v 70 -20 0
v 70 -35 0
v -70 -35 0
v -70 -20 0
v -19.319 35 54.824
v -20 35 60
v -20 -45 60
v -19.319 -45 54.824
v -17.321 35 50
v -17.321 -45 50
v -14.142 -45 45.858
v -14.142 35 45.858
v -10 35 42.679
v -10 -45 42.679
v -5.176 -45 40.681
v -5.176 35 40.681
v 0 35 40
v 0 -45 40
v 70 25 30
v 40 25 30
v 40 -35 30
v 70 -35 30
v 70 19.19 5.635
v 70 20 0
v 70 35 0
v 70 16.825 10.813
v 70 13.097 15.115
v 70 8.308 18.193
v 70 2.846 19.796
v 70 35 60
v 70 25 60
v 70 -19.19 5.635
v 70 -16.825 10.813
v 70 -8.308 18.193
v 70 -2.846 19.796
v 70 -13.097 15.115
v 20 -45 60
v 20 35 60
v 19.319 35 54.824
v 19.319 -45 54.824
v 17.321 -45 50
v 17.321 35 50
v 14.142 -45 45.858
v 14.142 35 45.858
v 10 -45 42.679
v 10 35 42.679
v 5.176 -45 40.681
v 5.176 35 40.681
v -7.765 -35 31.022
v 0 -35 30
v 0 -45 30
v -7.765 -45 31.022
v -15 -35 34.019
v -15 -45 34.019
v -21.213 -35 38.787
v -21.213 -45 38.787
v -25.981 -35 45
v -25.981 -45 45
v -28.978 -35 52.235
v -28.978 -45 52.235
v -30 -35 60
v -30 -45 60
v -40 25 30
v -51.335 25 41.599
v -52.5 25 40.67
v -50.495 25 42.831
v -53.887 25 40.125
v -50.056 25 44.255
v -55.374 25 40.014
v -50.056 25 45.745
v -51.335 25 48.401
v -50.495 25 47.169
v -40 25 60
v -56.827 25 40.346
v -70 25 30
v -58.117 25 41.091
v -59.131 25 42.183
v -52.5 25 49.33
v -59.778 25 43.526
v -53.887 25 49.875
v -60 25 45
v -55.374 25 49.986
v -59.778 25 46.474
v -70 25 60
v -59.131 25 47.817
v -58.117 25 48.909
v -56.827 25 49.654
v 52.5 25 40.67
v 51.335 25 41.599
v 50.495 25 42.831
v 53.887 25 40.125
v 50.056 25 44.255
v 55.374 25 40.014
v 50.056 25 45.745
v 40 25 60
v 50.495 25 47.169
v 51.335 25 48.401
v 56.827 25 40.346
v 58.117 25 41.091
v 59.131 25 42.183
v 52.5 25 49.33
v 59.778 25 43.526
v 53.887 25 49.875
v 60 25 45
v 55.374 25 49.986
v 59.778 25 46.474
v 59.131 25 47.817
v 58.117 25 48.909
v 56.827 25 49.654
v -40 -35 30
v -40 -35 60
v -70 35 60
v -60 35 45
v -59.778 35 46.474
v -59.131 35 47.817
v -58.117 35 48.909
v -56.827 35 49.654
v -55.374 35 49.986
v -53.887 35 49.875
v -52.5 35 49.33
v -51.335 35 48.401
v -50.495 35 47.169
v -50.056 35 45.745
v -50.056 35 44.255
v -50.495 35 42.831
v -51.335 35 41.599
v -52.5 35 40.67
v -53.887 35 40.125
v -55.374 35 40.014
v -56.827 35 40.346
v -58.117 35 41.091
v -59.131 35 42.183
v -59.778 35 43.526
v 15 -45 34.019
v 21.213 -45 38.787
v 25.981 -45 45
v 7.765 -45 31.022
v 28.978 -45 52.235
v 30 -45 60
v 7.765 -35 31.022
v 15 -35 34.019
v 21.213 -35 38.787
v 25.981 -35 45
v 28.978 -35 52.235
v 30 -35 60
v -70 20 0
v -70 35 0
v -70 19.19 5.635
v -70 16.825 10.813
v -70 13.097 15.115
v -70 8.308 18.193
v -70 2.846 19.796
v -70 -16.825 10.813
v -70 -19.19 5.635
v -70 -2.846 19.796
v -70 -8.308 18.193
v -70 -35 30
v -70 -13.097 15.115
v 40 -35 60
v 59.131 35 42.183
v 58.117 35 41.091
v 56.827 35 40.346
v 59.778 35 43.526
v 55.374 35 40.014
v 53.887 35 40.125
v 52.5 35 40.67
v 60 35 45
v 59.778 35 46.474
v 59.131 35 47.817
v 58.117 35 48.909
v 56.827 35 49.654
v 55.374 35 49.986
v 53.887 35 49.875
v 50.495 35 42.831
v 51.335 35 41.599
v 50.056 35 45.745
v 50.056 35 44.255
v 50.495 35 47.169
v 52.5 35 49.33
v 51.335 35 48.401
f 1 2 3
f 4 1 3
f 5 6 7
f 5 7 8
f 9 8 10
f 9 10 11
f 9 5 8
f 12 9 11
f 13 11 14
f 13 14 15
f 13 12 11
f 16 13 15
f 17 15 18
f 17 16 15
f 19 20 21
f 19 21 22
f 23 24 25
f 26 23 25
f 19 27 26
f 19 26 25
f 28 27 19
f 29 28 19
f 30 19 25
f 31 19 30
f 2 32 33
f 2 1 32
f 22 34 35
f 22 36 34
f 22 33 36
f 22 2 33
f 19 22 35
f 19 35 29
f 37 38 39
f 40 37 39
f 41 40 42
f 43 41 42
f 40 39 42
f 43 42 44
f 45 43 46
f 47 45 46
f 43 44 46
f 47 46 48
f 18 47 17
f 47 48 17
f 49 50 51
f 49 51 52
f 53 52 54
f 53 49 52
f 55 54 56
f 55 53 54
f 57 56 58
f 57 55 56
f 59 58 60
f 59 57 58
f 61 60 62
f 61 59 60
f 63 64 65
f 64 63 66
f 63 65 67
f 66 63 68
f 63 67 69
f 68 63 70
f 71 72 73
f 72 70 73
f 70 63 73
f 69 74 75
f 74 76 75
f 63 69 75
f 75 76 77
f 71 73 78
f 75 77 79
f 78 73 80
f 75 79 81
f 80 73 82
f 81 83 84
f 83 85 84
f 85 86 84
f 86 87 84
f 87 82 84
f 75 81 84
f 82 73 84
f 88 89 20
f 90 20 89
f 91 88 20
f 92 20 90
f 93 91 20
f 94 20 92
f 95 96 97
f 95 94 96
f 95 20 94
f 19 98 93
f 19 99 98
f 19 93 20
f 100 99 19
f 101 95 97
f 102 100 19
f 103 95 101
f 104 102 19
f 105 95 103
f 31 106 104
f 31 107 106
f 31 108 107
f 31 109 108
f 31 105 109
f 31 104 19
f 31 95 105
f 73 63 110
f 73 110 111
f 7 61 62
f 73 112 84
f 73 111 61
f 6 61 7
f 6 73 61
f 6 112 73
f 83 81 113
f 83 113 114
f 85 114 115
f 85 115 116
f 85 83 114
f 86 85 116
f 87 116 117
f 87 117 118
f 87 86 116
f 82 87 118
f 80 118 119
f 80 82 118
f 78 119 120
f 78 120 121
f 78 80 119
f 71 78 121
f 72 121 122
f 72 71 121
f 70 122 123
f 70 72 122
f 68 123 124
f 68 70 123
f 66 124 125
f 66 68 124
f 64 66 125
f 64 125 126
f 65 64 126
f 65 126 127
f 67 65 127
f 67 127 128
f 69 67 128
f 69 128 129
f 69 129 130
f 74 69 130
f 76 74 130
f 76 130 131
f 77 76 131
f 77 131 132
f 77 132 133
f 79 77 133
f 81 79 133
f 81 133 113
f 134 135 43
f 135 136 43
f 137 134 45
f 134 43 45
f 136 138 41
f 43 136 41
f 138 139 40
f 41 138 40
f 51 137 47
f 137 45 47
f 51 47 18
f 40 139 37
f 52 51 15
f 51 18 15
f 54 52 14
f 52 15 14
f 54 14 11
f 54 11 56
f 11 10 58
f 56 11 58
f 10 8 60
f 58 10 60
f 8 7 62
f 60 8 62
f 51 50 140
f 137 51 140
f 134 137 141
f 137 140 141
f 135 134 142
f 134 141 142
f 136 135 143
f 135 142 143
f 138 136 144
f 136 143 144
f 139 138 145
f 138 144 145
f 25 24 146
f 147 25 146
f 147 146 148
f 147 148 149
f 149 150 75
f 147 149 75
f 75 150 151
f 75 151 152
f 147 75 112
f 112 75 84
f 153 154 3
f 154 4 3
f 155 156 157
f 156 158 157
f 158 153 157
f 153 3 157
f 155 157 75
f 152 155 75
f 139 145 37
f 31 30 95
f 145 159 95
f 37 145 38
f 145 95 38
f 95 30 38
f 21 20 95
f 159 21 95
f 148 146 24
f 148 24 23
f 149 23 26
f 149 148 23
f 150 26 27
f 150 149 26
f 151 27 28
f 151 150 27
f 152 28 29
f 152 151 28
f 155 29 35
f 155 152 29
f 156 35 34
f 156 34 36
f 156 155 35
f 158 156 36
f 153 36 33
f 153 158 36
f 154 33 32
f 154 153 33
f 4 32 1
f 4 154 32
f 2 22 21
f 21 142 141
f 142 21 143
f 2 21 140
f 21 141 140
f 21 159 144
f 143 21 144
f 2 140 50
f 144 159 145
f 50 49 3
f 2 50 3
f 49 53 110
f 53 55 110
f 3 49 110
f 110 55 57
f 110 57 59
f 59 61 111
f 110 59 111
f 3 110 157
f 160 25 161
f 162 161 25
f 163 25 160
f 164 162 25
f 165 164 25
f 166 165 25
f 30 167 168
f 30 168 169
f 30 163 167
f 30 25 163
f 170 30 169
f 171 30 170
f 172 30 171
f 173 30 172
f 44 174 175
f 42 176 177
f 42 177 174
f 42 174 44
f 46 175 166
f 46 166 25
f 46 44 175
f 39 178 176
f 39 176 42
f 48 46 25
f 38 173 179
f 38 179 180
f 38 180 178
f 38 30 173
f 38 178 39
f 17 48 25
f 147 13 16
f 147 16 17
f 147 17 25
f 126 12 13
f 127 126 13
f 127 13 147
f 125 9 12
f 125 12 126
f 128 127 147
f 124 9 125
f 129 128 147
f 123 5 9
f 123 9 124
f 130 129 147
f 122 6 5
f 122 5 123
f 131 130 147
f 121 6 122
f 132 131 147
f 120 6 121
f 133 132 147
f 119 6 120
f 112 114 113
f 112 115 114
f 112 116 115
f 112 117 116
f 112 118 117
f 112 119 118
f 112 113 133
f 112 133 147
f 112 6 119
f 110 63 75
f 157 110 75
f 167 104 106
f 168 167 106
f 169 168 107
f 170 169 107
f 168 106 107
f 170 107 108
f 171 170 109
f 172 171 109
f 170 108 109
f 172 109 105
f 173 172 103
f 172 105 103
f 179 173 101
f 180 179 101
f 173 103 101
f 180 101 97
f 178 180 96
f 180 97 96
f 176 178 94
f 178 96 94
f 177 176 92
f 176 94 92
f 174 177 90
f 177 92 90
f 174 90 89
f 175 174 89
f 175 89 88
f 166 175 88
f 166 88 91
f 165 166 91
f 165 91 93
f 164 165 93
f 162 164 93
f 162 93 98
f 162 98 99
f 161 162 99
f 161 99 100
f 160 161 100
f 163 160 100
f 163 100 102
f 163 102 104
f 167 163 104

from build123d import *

# Parameters (mm, degrees)
F1_DEPTH = 35
F2_W     = 30
F2_H     = 30
F3_DEPTH = 60
F4_R     = 5
F5_DEPTH = 10.001
F7_DEPTH = 70.001
F9_DEPTH = 10


with BuildPart() as f1:
    # F0 (on Front) → F1 (new body, symmetric)
    with BuildSketch(Plane.XZ):
        with BuildLine():
            Line((0, 40), (0, 0))
            Line((0, 0), (70, 0))
            Line((70, 0), (70, 60))
            Line((70, 60), (20, 60))
            ThreePointArc((20, 60), (14.142136, 45.857864), (0, 40))
        make_face()
    extrude(amount=F1_DEPTH, both=True)

    # F2 (on face) → F3 (cut)
    with BuildSketch(Plane.XZ.offset(35)):
        with Locations((55, 45)):
            Rectangle(F2_W, F2_H)
    extrude(amount=-F3_DEPTH, mode=Mode.SUBTRACT)

    # F4 (on face) → F5 (cut, through all)
    with BuildSketch(Plane.XZ.offset(-25)):
        with Locations((55, 45)):
            Circle(F4_R)
    extrude(amount=-F5_DEPTH, mode=Mode.SUBTRACT)

    # F6 (on face) → F7 (cut, through all)
    with BuildSketch(Plane.YZ.offset(70)):
        with BuildLine():
            ThreePointArc((20, 0), (0, 20), (-20, 0))
            Line((-20, 0), (20, 0))
        make_face()
    extrude(amount=-F7_DEPTH, mode=Mode.SUBTRACT)

    # F8 (on face) → F9 (join)
    with BuildSketch(Plane.XZ.offset(35)):
        with BuildLine():
            Line((0, 40), (0, 29.999999))
            ThreePointArc((0, 29.999999), (21.213204, 38.786796), (30.000001, 60))
            Line((30.000001, 60), (20, 60))
            ThreePointArc((20, 60), (14.142136, 45.857864), (0, 40))
        make_face()
    extrude(amount=F9_DEPTH)

    # F10: F1 across plane


with BuildPart() as f1_1:
    add(f1.part)
    add(f1.part.mirror(Plane.YZ))


solid = f1_1.part
